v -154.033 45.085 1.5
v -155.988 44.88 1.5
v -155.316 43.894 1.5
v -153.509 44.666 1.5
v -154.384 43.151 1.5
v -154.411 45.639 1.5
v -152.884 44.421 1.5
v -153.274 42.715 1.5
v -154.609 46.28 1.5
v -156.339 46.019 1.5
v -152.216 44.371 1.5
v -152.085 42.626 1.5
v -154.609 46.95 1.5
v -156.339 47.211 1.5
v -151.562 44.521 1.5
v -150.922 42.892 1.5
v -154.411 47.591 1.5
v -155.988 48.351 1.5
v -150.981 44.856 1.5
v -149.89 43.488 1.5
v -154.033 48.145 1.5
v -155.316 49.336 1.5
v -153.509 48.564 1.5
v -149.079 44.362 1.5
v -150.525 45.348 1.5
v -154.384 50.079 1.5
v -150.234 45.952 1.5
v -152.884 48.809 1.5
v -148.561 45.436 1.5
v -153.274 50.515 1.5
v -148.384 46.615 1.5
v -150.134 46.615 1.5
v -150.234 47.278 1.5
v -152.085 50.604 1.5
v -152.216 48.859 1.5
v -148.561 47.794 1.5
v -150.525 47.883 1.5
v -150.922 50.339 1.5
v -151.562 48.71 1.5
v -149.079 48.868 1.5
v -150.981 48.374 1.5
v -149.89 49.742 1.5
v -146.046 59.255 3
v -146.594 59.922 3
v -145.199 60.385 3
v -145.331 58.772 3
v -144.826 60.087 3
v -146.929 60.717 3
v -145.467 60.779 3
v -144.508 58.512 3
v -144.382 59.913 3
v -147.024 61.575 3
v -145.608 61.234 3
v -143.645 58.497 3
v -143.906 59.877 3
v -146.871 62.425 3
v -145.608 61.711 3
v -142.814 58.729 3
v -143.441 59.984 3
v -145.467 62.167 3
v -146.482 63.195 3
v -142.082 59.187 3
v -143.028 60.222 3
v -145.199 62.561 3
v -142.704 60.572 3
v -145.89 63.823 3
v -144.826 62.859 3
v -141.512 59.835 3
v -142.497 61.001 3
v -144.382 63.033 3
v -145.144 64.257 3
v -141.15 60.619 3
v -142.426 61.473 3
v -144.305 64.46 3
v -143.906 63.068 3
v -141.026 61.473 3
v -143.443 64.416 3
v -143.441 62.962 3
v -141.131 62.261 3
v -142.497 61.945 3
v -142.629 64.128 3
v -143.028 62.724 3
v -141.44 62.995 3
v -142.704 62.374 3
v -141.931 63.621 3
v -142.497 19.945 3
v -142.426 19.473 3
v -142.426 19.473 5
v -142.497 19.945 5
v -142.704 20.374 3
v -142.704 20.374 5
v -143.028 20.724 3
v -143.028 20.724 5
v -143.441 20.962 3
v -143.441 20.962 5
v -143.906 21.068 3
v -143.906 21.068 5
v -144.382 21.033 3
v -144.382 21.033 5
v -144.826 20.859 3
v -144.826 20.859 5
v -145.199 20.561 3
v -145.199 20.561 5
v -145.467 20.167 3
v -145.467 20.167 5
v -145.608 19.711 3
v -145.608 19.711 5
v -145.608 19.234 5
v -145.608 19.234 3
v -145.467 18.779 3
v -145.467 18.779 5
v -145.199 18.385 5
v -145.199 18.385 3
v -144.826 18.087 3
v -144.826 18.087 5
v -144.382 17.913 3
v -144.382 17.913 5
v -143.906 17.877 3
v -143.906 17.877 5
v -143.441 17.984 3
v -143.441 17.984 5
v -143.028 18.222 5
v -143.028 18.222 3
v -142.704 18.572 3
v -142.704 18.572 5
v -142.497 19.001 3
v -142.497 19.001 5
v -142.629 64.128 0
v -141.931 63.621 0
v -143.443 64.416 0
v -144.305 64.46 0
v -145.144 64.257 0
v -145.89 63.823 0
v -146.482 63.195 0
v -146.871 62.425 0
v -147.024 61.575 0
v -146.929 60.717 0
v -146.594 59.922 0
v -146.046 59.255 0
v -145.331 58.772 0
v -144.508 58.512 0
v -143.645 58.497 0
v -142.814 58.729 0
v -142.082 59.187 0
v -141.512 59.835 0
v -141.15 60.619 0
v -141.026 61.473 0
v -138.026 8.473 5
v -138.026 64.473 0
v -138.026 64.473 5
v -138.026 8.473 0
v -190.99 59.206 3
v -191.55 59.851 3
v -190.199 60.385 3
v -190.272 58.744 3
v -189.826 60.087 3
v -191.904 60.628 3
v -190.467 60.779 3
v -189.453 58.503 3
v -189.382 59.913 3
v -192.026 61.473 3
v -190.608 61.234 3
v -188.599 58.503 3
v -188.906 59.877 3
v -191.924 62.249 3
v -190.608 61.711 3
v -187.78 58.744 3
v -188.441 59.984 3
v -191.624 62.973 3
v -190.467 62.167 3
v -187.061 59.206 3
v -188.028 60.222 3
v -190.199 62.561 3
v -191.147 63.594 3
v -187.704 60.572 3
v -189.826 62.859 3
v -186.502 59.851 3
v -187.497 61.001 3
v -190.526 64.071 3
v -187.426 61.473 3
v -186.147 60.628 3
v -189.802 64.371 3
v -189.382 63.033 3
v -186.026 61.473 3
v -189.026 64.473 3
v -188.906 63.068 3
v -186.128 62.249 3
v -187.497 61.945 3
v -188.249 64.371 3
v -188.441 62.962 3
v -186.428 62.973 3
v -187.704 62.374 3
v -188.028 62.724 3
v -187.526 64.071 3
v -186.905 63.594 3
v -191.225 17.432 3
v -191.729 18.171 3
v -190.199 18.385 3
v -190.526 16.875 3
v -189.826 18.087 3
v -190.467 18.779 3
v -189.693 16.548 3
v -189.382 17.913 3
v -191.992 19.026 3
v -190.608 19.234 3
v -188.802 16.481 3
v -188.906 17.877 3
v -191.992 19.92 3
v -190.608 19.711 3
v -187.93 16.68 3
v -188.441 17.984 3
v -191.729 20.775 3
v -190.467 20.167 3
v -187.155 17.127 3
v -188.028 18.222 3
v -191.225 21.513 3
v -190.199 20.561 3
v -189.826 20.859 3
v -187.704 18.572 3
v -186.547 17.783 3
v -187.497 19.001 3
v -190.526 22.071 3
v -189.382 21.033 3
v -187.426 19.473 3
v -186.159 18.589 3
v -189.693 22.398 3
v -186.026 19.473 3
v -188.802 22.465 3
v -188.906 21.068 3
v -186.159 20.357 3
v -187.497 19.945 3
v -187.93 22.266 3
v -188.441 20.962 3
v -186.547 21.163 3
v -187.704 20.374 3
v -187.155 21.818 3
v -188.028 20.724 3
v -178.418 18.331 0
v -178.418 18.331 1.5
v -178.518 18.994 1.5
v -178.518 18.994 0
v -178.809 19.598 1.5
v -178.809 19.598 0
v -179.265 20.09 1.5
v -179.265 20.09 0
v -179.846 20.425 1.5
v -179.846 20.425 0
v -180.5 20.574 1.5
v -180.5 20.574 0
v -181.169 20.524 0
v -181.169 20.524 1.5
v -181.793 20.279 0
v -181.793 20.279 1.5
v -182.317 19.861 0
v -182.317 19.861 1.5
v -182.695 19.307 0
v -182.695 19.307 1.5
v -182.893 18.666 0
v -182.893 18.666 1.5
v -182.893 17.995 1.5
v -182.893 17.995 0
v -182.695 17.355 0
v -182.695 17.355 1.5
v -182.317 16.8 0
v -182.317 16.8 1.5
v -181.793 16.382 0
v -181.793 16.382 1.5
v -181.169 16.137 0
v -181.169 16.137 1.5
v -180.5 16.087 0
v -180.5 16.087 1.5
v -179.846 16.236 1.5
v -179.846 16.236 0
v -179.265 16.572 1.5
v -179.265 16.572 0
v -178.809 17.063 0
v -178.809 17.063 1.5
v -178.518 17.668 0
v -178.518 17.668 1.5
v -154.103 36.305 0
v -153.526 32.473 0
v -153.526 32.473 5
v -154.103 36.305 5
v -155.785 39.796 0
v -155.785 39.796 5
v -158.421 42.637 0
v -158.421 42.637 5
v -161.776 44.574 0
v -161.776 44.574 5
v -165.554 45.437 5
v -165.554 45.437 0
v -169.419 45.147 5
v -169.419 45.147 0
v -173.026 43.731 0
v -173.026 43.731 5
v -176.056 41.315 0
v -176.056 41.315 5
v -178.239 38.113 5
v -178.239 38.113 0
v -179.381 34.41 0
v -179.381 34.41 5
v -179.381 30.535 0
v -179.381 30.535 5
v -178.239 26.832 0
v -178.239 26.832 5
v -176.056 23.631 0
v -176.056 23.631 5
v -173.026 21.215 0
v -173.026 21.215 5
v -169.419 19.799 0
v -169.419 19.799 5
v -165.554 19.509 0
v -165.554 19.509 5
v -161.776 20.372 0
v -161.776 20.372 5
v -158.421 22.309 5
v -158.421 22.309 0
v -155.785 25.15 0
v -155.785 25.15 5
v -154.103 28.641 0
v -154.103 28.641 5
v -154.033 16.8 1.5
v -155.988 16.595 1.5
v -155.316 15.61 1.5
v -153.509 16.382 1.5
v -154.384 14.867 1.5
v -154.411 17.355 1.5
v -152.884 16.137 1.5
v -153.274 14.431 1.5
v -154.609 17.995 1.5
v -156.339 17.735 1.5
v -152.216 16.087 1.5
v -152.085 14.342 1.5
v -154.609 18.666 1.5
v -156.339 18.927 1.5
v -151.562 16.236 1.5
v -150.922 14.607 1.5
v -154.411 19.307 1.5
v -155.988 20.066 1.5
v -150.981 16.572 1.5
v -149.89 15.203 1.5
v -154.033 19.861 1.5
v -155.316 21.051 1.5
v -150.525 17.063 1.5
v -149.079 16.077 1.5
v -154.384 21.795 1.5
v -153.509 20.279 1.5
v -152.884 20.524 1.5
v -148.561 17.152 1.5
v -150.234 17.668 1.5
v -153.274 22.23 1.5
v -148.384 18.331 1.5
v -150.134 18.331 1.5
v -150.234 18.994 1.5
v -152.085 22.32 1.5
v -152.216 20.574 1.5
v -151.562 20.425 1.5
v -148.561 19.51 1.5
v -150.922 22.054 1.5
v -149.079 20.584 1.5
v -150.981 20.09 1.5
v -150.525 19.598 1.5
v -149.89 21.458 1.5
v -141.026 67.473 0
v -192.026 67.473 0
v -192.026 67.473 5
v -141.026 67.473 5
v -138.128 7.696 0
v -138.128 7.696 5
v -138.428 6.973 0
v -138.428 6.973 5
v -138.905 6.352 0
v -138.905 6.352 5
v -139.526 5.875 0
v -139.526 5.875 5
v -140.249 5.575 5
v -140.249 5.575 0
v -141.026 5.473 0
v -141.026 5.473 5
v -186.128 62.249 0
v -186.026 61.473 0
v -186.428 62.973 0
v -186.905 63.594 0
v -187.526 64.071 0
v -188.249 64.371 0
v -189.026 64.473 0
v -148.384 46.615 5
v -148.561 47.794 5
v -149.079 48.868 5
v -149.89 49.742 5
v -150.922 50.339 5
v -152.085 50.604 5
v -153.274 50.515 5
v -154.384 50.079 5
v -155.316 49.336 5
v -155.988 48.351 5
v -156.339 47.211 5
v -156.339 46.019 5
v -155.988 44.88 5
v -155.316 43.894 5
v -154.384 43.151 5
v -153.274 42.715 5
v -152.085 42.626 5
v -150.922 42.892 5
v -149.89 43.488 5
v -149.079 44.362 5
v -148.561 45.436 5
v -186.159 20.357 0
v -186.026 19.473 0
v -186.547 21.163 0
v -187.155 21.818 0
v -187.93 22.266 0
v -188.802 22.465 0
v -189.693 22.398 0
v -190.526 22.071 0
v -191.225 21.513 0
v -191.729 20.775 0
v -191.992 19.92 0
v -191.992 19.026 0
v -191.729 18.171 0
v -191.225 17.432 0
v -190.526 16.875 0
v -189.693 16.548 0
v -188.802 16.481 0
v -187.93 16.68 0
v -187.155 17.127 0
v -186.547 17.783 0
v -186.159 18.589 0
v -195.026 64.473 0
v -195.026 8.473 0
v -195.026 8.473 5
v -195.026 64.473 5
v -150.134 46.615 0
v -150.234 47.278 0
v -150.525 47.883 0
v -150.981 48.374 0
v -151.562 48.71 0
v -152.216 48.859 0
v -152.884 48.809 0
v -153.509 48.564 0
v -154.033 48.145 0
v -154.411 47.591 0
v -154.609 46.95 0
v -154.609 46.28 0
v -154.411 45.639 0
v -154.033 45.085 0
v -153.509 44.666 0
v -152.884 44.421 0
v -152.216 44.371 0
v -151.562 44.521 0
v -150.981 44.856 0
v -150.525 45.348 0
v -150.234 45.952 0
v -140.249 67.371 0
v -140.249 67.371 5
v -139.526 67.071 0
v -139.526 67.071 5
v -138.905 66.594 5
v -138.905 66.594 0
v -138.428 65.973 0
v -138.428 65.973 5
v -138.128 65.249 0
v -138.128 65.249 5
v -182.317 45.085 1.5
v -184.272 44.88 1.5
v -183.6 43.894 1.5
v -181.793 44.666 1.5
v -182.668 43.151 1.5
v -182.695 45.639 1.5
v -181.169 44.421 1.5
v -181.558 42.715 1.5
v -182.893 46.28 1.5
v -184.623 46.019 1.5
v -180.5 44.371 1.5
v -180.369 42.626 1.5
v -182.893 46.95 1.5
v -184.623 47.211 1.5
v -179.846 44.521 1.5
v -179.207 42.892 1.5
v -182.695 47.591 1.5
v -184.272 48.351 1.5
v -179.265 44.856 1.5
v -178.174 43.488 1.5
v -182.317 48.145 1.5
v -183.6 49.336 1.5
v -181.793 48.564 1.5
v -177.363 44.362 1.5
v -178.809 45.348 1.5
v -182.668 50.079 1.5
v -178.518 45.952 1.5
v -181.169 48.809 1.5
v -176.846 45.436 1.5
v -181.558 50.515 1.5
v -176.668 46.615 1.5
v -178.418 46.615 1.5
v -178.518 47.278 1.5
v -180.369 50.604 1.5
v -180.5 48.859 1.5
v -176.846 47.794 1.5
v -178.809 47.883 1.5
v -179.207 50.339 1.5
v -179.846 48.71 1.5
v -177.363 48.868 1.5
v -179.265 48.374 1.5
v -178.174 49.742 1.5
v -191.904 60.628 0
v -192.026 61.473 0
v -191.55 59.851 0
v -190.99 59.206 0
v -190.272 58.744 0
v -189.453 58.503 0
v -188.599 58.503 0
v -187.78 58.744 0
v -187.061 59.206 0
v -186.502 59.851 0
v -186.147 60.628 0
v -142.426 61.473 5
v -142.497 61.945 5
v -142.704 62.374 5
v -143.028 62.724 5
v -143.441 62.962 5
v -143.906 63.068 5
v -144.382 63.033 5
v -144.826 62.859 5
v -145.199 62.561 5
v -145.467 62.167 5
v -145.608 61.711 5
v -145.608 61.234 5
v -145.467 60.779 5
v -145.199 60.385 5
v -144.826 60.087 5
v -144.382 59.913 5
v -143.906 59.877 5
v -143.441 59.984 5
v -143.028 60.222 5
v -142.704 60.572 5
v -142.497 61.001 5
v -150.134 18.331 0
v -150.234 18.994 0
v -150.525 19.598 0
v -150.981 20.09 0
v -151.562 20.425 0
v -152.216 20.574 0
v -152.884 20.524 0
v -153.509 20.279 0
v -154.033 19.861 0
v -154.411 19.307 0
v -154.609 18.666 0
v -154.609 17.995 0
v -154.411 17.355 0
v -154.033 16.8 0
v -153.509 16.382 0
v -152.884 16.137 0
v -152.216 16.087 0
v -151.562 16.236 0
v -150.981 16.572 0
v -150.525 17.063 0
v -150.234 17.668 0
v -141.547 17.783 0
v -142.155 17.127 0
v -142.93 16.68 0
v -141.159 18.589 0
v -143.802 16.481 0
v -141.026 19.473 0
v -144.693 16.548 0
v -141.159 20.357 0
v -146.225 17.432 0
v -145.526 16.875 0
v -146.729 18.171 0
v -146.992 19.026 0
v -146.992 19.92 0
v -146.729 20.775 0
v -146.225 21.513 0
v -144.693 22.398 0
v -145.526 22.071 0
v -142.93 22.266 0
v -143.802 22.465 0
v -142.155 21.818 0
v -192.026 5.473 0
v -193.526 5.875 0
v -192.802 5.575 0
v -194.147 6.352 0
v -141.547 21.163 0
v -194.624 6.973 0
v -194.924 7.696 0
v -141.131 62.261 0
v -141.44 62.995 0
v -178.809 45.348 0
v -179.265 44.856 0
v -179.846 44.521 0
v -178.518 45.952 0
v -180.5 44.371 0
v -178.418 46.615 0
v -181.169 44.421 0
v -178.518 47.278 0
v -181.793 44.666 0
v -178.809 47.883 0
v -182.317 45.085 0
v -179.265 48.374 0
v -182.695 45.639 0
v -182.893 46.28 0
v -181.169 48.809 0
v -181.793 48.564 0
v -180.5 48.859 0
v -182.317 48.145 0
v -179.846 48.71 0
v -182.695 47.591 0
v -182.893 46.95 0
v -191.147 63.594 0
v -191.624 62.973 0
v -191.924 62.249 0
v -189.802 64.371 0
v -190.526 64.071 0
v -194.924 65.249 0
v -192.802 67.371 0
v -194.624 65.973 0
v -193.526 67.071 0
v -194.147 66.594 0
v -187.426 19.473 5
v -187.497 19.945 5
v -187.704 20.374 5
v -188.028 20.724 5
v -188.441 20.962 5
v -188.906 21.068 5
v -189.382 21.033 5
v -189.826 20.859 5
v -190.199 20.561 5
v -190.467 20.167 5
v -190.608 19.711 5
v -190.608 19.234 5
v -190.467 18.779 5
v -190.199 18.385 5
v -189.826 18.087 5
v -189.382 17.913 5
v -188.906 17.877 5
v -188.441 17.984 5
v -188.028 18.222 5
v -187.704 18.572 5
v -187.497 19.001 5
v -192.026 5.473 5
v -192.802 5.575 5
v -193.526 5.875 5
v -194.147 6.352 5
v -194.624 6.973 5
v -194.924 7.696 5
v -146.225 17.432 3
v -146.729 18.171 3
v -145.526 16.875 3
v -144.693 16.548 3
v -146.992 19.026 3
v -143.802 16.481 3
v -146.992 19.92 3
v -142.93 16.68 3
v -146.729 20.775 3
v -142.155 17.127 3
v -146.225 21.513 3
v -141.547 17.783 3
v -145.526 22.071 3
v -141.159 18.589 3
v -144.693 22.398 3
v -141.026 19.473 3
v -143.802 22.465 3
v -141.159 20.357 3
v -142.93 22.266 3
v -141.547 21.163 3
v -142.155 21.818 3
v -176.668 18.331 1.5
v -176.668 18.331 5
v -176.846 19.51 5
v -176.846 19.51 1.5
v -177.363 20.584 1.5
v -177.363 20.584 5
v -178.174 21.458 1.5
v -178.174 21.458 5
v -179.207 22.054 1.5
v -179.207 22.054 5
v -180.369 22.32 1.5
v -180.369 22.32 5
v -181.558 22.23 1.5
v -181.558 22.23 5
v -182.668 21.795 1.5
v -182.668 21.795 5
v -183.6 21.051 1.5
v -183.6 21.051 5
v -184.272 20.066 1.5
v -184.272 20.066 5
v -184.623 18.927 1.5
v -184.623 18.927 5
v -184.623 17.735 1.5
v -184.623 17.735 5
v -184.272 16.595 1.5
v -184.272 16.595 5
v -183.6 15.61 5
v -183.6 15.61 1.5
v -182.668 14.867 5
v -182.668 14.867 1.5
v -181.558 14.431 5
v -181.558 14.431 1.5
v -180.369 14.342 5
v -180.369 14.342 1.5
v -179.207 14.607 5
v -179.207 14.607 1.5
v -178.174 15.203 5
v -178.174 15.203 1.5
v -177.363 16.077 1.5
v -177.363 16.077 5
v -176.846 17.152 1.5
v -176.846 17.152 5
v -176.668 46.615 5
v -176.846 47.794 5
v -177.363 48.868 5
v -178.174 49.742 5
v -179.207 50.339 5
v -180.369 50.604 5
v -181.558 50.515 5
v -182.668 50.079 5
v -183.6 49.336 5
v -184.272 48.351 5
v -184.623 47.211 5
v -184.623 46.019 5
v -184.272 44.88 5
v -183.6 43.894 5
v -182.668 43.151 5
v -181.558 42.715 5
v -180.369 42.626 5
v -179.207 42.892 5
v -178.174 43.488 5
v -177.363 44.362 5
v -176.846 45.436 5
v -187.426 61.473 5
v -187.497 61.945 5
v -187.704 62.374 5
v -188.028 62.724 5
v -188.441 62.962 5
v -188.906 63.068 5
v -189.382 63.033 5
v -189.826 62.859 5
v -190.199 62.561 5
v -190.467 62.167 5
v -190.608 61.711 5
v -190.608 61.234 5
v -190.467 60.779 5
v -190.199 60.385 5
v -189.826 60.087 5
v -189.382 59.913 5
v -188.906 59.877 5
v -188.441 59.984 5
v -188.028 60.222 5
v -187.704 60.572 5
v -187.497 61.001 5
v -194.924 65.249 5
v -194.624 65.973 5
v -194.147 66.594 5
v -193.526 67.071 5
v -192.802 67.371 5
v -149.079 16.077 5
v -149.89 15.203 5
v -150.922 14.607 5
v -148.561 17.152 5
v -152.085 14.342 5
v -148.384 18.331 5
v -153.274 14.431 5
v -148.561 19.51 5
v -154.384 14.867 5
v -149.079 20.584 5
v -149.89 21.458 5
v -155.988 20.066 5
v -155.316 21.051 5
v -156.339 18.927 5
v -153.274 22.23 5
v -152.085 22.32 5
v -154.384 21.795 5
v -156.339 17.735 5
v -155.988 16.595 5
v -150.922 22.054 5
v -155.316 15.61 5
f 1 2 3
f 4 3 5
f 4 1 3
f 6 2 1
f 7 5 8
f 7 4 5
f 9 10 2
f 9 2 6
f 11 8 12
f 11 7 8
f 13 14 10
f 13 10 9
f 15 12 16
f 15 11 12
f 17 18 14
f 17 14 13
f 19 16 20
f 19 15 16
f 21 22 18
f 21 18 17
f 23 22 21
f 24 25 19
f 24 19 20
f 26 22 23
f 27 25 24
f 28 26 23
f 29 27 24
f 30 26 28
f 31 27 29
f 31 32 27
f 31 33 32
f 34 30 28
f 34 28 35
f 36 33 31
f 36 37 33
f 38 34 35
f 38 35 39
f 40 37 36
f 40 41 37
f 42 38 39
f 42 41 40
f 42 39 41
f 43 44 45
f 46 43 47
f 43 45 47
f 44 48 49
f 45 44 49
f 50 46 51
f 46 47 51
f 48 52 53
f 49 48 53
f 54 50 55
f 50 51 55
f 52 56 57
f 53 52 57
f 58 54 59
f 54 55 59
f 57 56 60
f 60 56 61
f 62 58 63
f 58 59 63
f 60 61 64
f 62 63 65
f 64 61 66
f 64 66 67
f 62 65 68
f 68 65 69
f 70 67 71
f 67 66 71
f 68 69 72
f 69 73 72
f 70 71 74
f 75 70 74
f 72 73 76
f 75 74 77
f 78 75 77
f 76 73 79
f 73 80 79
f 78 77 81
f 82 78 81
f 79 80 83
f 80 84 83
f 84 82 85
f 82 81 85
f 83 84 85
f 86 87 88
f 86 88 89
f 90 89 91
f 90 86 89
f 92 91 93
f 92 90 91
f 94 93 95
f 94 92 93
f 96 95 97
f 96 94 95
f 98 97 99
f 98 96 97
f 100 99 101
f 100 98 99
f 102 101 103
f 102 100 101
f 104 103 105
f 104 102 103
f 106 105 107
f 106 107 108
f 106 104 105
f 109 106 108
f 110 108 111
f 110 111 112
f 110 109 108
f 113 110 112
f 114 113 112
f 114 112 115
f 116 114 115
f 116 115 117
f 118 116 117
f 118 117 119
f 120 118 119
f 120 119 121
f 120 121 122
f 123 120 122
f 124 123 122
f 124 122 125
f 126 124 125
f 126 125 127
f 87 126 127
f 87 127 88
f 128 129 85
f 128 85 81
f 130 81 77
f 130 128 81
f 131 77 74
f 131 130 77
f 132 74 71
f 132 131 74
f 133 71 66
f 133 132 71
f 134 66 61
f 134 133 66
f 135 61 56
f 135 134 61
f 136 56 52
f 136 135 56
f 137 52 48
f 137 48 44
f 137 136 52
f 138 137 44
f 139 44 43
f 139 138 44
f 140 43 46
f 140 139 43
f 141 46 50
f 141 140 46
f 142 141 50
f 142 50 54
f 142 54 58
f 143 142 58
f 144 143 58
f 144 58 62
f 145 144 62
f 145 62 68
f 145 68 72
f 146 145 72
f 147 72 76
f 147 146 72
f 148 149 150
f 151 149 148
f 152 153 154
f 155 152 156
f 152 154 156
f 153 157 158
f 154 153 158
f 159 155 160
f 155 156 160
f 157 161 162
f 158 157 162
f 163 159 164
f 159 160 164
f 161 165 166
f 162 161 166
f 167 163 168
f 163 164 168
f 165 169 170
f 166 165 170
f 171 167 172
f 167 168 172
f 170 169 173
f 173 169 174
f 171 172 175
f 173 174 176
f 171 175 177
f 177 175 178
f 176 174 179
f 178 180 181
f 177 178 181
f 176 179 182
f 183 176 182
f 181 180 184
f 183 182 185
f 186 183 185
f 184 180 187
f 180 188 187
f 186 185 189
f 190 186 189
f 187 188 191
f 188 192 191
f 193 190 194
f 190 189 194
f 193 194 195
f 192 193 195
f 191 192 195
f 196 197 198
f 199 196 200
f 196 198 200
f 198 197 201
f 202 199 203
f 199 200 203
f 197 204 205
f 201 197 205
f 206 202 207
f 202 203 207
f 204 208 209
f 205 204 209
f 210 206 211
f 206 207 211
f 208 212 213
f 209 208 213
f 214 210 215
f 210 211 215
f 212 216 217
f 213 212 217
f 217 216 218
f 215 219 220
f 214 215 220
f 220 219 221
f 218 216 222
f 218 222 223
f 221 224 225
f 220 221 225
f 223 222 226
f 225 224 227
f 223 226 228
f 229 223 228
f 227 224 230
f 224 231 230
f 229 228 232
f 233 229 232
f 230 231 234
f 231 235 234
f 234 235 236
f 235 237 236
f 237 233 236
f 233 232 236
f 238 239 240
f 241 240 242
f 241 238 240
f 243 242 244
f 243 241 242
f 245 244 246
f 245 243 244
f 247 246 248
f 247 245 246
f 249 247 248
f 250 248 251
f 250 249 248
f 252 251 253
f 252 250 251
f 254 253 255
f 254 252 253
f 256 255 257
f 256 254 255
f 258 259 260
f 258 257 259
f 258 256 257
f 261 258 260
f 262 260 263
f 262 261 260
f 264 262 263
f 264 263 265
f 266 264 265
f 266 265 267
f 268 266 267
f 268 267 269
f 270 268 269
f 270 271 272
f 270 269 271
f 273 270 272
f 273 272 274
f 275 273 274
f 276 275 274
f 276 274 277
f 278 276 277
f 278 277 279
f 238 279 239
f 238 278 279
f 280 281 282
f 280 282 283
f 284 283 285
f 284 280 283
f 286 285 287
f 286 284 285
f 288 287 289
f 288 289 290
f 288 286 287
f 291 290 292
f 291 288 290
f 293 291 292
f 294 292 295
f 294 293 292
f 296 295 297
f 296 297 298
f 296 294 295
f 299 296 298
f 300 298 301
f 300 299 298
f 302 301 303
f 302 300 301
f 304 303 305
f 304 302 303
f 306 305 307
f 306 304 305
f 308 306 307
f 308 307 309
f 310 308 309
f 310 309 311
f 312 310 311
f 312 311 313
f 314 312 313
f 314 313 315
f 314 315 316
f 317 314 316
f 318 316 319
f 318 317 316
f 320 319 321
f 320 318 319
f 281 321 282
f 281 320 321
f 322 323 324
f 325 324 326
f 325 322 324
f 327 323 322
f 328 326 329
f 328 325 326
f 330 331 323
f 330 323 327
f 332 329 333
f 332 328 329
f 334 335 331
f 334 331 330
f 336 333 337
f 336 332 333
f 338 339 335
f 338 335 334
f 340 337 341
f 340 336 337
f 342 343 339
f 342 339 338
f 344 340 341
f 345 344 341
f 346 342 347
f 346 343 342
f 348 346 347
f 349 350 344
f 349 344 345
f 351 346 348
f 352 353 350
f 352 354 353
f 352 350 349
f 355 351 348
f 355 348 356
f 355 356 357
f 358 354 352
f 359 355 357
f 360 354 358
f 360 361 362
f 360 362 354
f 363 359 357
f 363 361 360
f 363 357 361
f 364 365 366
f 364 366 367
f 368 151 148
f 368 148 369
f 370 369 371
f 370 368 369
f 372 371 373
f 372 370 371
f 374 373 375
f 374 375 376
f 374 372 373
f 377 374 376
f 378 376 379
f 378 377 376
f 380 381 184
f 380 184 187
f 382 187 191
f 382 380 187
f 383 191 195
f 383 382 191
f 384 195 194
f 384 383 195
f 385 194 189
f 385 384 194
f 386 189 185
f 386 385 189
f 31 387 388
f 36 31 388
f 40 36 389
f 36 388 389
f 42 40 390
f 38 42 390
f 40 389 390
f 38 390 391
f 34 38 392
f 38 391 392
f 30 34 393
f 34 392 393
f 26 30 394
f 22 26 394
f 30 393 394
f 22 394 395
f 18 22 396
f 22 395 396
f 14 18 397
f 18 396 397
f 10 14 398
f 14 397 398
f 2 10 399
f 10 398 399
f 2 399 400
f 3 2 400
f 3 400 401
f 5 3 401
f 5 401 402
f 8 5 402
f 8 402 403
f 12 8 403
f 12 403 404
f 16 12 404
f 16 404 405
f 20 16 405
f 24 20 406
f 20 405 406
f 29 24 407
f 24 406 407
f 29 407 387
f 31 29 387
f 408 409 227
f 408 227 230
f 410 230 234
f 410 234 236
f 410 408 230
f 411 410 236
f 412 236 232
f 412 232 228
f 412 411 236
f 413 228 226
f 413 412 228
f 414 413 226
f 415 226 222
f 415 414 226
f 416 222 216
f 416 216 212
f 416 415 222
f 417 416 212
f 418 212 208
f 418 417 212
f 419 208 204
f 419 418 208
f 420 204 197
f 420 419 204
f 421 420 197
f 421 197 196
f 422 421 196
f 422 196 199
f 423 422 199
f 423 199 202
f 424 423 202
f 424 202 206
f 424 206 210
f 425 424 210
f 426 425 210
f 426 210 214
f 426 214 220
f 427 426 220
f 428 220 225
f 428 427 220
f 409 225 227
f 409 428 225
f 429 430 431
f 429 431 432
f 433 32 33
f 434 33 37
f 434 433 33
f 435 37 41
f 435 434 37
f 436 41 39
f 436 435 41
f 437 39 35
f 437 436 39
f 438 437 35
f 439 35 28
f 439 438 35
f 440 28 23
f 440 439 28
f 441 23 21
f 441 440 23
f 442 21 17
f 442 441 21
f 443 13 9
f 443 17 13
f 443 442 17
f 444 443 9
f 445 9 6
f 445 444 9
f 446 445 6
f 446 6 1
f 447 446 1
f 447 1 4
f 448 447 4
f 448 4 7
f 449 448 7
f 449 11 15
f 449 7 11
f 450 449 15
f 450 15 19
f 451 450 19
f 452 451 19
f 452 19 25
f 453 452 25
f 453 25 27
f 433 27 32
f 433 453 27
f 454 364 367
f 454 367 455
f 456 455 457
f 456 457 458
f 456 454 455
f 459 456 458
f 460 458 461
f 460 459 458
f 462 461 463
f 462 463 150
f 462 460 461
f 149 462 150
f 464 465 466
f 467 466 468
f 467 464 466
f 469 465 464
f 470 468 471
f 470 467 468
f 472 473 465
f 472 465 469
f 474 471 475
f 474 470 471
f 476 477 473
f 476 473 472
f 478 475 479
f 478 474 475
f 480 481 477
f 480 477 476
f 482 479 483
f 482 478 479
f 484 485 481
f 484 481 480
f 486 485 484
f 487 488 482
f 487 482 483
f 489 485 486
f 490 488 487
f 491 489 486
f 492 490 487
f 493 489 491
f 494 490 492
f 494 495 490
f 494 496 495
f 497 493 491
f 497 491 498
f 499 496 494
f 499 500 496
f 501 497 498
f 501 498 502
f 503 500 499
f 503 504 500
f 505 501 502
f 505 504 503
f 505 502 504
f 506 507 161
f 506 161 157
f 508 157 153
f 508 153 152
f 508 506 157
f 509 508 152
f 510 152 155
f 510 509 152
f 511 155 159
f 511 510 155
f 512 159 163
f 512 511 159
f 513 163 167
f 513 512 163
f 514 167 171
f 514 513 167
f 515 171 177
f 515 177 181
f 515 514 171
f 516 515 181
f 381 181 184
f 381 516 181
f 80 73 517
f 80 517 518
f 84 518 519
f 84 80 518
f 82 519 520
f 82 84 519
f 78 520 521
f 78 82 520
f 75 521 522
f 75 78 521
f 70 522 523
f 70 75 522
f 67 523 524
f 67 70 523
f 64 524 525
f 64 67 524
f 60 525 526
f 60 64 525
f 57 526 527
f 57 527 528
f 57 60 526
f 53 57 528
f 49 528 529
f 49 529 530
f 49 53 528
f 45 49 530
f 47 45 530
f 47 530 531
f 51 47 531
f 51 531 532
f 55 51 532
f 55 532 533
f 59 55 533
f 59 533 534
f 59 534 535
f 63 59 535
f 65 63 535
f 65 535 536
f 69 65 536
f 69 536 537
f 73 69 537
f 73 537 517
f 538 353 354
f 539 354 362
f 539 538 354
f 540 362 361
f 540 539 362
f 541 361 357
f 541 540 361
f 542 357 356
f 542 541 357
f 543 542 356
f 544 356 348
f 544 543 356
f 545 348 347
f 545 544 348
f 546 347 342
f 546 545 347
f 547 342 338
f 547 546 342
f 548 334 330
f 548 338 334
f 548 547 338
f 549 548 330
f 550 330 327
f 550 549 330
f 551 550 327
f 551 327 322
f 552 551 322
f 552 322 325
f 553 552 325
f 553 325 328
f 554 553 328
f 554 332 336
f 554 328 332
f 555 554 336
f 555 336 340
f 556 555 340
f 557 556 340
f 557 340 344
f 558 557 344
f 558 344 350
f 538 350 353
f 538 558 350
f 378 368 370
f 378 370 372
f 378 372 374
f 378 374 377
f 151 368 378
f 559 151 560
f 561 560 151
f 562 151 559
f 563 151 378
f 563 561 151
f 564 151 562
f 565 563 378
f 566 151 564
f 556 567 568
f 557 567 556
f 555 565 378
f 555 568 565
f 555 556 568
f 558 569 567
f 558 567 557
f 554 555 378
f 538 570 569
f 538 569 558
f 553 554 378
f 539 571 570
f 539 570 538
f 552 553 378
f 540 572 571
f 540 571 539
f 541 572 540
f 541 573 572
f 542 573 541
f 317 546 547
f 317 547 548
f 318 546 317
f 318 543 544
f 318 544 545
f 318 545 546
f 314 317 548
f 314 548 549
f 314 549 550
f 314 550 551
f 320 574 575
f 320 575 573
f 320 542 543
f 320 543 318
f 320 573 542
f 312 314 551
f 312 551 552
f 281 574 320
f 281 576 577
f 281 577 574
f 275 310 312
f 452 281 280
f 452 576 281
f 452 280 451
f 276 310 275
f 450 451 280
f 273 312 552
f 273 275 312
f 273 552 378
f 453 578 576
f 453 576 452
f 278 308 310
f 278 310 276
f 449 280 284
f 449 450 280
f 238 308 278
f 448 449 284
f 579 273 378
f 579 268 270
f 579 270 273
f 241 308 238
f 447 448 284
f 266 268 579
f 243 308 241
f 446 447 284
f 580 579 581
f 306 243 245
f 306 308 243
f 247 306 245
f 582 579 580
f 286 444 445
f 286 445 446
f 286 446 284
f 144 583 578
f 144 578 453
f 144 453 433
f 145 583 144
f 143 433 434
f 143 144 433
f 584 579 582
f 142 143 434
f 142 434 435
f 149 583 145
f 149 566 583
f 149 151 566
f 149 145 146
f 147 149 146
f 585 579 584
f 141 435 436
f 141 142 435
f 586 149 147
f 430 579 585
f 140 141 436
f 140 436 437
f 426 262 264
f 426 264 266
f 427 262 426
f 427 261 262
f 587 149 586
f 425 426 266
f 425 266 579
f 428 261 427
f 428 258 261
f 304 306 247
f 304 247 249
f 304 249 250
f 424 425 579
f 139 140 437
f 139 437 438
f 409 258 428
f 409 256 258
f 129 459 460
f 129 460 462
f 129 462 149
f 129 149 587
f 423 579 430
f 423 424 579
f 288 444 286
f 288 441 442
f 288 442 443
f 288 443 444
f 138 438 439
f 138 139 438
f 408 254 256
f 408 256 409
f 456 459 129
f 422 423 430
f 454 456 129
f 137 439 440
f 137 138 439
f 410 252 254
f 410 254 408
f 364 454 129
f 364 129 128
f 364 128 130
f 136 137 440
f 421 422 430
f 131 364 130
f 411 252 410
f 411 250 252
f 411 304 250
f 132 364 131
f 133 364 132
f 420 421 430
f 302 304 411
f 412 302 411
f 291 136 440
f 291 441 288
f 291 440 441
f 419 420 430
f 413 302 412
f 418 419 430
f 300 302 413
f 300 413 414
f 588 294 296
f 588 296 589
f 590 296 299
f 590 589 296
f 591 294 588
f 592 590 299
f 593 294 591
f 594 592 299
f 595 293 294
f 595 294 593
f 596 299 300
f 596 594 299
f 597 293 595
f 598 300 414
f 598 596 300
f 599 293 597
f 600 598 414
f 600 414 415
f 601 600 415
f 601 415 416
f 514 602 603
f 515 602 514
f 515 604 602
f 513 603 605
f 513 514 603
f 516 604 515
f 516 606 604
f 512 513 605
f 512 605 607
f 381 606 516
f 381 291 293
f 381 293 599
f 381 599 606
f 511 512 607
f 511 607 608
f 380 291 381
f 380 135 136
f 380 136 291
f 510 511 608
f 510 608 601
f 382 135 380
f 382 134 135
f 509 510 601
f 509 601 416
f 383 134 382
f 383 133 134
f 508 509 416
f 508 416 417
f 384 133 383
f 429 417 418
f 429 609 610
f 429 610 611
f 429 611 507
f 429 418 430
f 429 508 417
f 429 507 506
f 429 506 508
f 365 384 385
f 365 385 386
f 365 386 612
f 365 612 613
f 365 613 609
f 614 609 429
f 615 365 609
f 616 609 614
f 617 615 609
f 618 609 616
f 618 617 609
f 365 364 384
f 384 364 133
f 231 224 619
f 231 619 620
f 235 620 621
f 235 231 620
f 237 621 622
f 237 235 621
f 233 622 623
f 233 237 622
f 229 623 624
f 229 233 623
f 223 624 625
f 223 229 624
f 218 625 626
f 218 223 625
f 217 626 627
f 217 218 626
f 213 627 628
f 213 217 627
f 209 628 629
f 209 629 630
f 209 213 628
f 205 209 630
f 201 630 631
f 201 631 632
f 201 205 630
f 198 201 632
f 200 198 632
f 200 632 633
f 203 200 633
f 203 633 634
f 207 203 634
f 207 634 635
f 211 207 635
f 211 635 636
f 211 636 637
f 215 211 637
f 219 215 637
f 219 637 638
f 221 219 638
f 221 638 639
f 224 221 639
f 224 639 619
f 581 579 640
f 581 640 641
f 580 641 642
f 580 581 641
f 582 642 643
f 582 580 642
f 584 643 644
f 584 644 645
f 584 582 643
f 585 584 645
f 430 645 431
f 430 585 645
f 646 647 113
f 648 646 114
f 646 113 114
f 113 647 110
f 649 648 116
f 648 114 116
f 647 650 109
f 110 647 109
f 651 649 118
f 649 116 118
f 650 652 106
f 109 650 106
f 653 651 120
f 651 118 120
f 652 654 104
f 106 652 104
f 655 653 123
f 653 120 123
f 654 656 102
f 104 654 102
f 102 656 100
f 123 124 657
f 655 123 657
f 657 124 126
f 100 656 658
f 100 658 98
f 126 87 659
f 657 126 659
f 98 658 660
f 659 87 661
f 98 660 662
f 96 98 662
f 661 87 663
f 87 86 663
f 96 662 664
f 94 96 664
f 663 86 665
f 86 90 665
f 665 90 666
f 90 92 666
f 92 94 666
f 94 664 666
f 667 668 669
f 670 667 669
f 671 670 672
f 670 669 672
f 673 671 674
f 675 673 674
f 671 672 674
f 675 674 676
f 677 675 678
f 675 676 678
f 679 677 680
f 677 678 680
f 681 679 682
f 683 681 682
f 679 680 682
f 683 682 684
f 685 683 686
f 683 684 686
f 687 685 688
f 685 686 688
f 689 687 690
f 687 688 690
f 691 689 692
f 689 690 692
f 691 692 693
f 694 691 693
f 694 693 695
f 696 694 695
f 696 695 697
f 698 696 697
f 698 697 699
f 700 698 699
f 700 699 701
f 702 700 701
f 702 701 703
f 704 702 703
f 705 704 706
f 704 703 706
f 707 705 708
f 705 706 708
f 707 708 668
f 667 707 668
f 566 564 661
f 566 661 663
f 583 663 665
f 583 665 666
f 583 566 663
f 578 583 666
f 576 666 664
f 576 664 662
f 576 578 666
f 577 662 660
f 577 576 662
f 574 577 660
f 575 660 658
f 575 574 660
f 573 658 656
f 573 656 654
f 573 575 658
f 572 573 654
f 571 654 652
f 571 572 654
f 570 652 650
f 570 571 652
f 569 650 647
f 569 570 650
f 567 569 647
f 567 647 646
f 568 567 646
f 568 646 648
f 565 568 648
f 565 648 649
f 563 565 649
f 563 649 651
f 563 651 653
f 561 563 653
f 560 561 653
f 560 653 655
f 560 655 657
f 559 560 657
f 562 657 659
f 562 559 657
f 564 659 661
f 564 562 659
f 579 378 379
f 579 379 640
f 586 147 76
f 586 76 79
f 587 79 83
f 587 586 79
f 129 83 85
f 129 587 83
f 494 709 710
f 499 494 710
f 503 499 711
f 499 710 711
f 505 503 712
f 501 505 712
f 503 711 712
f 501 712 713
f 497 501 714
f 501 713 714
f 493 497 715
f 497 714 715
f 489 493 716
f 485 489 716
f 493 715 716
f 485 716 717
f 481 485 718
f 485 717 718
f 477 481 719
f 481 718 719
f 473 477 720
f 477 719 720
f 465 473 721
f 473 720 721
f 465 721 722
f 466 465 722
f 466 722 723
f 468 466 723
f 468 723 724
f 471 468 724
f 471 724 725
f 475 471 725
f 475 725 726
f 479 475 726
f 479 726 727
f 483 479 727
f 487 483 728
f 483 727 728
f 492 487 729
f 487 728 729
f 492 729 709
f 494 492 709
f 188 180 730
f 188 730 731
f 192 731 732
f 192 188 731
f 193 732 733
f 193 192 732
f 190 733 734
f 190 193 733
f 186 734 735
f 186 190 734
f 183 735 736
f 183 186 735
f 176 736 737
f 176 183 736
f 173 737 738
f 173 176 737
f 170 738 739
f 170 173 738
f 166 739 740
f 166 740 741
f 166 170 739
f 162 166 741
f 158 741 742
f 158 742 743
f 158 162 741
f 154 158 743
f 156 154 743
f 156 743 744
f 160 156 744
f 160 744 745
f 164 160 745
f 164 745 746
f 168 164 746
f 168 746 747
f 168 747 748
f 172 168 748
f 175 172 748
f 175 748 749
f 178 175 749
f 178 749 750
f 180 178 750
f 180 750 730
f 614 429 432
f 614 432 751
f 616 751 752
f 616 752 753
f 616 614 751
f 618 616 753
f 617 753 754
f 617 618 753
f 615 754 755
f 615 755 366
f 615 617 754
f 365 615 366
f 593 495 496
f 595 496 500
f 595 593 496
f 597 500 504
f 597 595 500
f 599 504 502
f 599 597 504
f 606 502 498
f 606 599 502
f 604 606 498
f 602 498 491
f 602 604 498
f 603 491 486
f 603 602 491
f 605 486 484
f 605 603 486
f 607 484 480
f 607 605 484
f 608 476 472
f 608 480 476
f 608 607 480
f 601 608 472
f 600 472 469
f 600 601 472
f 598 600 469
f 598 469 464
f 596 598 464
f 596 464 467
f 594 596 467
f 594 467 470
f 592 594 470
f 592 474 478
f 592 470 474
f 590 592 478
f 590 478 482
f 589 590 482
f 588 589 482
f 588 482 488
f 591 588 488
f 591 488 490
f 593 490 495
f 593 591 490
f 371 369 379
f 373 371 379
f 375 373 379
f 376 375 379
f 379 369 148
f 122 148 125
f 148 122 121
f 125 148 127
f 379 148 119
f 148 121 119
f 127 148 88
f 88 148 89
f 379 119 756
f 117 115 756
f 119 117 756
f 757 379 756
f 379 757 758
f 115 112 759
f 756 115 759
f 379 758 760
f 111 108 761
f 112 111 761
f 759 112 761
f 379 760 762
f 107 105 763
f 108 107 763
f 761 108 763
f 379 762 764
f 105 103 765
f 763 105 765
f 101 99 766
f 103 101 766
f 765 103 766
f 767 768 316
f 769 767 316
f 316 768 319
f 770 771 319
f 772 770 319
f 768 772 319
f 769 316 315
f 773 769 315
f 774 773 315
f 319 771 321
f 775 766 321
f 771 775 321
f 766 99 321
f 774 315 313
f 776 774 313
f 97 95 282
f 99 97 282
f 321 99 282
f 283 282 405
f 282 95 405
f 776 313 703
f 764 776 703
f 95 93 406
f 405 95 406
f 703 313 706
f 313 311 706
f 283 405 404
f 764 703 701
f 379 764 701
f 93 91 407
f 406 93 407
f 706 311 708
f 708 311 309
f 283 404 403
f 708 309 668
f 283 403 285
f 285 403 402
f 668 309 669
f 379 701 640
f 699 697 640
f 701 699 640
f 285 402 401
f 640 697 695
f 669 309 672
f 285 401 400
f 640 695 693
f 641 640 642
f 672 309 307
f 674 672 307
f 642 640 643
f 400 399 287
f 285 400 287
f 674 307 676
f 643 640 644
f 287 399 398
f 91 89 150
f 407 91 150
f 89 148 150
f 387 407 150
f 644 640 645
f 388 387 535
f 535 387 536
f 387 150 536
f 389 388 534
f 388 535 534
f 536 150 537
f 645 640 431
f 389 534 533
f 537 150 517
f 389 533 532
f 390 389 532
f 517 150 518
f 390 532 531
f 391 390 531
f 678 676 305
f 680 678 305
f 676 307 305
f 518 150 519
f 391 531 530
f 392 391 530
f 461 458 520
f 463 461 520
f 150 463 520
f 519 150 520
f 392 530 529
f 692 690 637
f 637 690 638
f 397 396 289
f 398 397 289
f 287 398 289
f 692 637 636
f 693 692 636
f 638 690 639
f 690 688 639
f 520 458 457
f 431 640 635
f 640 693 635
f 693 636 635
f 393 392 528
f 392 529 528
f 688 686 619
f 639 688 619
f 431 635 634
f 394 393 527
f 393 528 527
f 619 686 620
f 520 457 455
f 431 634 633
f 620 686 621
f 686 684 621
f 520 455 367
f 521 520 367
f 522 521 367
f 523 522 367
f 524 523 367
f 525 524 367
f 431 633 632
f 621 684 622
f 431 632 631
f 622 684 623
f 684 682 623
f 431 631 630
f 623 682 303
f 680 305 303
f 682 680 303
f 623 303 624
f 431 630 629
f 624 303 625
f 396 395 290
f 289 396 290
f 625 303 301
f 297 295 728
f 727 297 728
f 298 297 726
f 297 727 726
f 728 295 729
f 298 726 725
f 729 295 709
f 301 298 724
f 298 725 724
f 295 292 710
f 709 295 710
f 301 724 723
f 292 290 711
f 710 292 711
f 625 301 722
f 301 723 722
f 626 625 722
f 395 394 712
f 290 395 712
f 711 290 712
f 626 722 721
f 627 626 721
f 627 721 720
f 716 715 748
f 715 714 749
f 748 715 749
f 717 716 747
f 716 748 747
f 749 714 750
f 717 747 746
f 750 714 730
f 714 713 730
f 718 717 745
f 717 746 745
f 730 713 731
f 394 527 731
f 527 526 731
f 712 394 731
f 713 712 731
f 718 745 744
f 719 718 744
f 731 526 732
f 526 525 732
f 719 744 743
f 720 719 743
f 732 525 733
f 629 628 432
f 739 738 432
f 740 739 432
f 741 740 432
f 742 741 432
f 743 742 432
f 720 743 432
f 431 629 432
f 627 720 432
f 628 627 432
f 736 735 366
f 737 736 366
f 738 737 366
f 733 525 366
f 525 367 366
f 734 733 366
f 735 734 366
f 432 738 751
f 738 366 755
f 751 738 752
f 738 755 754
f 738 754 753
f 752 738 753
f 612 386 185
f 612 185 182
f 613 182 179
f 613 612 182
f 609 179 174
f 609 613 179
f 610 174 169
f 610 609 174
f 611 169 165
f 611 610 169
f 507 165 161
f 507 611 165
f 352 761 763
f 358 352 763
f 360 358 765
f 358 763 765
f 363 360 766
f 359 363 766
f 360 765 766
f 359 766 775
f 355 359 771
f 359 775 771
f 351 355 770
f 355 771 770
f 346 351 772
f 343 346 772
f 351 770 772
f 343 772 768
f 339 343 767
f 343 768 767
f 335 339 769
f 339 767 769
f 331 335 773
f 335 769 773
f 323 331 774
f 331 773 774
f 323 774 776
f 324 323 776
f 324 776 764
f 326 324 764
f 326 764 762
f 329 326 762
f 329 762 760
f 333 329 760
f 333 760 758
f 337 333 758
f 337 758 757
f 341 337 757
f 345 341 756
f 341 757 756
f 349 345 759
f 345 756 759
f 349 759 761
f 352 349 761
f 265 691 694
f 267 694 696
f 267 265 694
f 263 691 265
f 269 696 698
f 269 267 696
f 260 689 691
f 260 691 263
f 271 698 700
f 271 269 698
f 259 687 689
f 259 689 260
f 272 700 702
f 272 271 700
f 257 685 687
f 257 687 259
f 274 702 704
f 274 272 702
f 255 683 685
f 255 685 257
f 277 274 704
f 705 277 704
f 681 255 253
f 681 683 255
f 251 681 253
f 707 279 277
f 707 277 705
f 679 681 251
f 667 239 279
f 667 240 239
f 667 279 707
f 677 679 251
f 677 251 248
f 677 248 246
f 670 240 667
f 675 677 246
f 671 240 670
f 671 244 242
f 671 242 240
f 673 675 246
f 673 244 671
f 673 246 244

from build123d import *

# Parameters (mm, degrees)
SKETCH1_R           = 2.25
SKETCH1_R_2         = 13
SKETCH1_R_3         = 1.6
BOSS_EXTRUDE1_DEPTH = 5
SKETCH1_5_R         = 3
SKETCH1_5_R_2       = 1.6
CUT_EXTRUDE1_DEPTH  = 3
SKETCH2_R           = 4
CUT_EXTRUDE2_DEPTH  = 3.5


with BuildPart() as part:
    # Sketch1 → Boss-Extrude1 (new body)
    with BuildSketch(Plane.XY):
        with BuildLine():
            Line((-141.025912834, 67.472903007), (-192.025912834, 67.472903007))
            ThreePointArc((-192.025912834, 67.472903007), (-194.147233178, 66.59422335), (-195.025912834, 64.472903007))
            Line((-195.025912834, 64.472903007), (-195.025912834, 8.472903007))
            ThreePointArc((-195.025912834, 8.472903007), (-194.147233178, 6.351582663), (-192.025912834, 5.472903007))
            Line((-192.025912834, 5.472903007), (-141.025912834, 5.472903007))
            ThreePointArc((-141.025912834, 5.472903007), (-138.90459249, 6.351582663), (-138.025912834, 8.472903007))
            Line((-138.025912834, 8.472903007), (-138.025912834, 64.472903007))
            ThreePointArc((-138.025912834, 64.472903007), (-138.90459249, 66.59422335), (-141.025912834, 67.472903007))
        make_face()
        with Locations((-180.668048458, 18.330767383)):
            Circle(SKETCH1_R, mode=Mode.SUBTRACT)
        with Locations((-152.38377721, 18.330767383)):
            Circle(SKETCH1_R, mode=Mode.SUBTRACT)
        with Locations((-166.525912834, 32.472903007)):
            Circle(SKETCH1_R_2, mode=Mode.SUBTRACT)
        with Locations((-180.668048458, 46.61503863)):
            Circle(SKETCH1_R, mode=Mode.SUBTRACT)
        with Locations((-152.38377721, 46.61503863)):
            Circle(SKETCH1_R, mode=Mode.SUBTRACT)
        with Locations((-189.025912834, 19.472903007)):
            Circle(SKETCH1_R_3, mode=Mode.SUBTRACT)
        with Locations((-144.025912834, 19.472903007)):
            Circle(SKETCH1_R_3, mode=Mode.SUBTRACT)
        with Locations((-189.025912834, 61.472903007)):
            Circle(SKETCH1_R_3, mode=Mode.SUBTRACT)
        with Locations((-144.025912834, 61.472903007)):
            Circle(SKETCH1_R_3, mode=Mode.SUBTRACT)
    extrude(amount=BOSS_EXTRUDE1_DEPTH)

    # Sketch1<5> → Cut-Extrude1 (cut)
    # profile 1 of 4: a face of its own
    with BuildSketch(Plane.XY):
        with Locations((-144.025912834, 61.472903007)):
            Circle(SKETCH1_5_R)
        with Locations((-144.025912834, 61.472903007)):
            Circle(SKETCH1_5_R_2, mode=Mode.SUBTRACT)
    # profile 2 of 4: a face of its own
    with BuildSketch(Plane.XY):
        with Locations((-189.025912834, 61.472903007)):
            Circle(SKETCH1_5_R)
        with Locations((-189.025912834, 61.472903007)):
            Circle(SKETCH1_5_R_2, mode=Mode.SUBTRACT)
    # profile 3 of 4: a face of its own
    with BuildSketch(Plane.XY):
        with Locations((-189.025912834, 19.472903007)):
            Circle(SKETCH1_5_R)
    # profile 4 of 4: a face of its own
    with BuildSketch(Plane.XY):
        with Locations((-144.025912834, 19.472903007)):
            Circle(SKETCH1_5_R)
        with Locations((-144.025912834, 19.472903007)):
            Circle(SKETCH1_5_R_2, mode=Mode.SUBTRACT)
    extrude(amount=CUT_EXTRUDE1_DEPTH, mode=Mode.SUBTRACT)

    # Sketch2 → Cut-Extrude2 (cut)
    with BuildSketch(Plane.XY.offset(5)):
        with Locations((-180.668048458, 46.61503863)):
            Circle(SKETCH2_R)
        with Locations((-152.38377721, 46.61503863)):
            Circle(SKETCH2_R)
        with Locations((-152.38377721, 18.330767383)):
            Circle(SKETCH2_R)
        with Locations((-180.668048458, 18.330767383)):
            Circle(SKETCH2_R)
    extrude(amount=-CUT_EXTRUDE2_DEPTH, mode=Mode.SUBTRACT)


solid = part.part
